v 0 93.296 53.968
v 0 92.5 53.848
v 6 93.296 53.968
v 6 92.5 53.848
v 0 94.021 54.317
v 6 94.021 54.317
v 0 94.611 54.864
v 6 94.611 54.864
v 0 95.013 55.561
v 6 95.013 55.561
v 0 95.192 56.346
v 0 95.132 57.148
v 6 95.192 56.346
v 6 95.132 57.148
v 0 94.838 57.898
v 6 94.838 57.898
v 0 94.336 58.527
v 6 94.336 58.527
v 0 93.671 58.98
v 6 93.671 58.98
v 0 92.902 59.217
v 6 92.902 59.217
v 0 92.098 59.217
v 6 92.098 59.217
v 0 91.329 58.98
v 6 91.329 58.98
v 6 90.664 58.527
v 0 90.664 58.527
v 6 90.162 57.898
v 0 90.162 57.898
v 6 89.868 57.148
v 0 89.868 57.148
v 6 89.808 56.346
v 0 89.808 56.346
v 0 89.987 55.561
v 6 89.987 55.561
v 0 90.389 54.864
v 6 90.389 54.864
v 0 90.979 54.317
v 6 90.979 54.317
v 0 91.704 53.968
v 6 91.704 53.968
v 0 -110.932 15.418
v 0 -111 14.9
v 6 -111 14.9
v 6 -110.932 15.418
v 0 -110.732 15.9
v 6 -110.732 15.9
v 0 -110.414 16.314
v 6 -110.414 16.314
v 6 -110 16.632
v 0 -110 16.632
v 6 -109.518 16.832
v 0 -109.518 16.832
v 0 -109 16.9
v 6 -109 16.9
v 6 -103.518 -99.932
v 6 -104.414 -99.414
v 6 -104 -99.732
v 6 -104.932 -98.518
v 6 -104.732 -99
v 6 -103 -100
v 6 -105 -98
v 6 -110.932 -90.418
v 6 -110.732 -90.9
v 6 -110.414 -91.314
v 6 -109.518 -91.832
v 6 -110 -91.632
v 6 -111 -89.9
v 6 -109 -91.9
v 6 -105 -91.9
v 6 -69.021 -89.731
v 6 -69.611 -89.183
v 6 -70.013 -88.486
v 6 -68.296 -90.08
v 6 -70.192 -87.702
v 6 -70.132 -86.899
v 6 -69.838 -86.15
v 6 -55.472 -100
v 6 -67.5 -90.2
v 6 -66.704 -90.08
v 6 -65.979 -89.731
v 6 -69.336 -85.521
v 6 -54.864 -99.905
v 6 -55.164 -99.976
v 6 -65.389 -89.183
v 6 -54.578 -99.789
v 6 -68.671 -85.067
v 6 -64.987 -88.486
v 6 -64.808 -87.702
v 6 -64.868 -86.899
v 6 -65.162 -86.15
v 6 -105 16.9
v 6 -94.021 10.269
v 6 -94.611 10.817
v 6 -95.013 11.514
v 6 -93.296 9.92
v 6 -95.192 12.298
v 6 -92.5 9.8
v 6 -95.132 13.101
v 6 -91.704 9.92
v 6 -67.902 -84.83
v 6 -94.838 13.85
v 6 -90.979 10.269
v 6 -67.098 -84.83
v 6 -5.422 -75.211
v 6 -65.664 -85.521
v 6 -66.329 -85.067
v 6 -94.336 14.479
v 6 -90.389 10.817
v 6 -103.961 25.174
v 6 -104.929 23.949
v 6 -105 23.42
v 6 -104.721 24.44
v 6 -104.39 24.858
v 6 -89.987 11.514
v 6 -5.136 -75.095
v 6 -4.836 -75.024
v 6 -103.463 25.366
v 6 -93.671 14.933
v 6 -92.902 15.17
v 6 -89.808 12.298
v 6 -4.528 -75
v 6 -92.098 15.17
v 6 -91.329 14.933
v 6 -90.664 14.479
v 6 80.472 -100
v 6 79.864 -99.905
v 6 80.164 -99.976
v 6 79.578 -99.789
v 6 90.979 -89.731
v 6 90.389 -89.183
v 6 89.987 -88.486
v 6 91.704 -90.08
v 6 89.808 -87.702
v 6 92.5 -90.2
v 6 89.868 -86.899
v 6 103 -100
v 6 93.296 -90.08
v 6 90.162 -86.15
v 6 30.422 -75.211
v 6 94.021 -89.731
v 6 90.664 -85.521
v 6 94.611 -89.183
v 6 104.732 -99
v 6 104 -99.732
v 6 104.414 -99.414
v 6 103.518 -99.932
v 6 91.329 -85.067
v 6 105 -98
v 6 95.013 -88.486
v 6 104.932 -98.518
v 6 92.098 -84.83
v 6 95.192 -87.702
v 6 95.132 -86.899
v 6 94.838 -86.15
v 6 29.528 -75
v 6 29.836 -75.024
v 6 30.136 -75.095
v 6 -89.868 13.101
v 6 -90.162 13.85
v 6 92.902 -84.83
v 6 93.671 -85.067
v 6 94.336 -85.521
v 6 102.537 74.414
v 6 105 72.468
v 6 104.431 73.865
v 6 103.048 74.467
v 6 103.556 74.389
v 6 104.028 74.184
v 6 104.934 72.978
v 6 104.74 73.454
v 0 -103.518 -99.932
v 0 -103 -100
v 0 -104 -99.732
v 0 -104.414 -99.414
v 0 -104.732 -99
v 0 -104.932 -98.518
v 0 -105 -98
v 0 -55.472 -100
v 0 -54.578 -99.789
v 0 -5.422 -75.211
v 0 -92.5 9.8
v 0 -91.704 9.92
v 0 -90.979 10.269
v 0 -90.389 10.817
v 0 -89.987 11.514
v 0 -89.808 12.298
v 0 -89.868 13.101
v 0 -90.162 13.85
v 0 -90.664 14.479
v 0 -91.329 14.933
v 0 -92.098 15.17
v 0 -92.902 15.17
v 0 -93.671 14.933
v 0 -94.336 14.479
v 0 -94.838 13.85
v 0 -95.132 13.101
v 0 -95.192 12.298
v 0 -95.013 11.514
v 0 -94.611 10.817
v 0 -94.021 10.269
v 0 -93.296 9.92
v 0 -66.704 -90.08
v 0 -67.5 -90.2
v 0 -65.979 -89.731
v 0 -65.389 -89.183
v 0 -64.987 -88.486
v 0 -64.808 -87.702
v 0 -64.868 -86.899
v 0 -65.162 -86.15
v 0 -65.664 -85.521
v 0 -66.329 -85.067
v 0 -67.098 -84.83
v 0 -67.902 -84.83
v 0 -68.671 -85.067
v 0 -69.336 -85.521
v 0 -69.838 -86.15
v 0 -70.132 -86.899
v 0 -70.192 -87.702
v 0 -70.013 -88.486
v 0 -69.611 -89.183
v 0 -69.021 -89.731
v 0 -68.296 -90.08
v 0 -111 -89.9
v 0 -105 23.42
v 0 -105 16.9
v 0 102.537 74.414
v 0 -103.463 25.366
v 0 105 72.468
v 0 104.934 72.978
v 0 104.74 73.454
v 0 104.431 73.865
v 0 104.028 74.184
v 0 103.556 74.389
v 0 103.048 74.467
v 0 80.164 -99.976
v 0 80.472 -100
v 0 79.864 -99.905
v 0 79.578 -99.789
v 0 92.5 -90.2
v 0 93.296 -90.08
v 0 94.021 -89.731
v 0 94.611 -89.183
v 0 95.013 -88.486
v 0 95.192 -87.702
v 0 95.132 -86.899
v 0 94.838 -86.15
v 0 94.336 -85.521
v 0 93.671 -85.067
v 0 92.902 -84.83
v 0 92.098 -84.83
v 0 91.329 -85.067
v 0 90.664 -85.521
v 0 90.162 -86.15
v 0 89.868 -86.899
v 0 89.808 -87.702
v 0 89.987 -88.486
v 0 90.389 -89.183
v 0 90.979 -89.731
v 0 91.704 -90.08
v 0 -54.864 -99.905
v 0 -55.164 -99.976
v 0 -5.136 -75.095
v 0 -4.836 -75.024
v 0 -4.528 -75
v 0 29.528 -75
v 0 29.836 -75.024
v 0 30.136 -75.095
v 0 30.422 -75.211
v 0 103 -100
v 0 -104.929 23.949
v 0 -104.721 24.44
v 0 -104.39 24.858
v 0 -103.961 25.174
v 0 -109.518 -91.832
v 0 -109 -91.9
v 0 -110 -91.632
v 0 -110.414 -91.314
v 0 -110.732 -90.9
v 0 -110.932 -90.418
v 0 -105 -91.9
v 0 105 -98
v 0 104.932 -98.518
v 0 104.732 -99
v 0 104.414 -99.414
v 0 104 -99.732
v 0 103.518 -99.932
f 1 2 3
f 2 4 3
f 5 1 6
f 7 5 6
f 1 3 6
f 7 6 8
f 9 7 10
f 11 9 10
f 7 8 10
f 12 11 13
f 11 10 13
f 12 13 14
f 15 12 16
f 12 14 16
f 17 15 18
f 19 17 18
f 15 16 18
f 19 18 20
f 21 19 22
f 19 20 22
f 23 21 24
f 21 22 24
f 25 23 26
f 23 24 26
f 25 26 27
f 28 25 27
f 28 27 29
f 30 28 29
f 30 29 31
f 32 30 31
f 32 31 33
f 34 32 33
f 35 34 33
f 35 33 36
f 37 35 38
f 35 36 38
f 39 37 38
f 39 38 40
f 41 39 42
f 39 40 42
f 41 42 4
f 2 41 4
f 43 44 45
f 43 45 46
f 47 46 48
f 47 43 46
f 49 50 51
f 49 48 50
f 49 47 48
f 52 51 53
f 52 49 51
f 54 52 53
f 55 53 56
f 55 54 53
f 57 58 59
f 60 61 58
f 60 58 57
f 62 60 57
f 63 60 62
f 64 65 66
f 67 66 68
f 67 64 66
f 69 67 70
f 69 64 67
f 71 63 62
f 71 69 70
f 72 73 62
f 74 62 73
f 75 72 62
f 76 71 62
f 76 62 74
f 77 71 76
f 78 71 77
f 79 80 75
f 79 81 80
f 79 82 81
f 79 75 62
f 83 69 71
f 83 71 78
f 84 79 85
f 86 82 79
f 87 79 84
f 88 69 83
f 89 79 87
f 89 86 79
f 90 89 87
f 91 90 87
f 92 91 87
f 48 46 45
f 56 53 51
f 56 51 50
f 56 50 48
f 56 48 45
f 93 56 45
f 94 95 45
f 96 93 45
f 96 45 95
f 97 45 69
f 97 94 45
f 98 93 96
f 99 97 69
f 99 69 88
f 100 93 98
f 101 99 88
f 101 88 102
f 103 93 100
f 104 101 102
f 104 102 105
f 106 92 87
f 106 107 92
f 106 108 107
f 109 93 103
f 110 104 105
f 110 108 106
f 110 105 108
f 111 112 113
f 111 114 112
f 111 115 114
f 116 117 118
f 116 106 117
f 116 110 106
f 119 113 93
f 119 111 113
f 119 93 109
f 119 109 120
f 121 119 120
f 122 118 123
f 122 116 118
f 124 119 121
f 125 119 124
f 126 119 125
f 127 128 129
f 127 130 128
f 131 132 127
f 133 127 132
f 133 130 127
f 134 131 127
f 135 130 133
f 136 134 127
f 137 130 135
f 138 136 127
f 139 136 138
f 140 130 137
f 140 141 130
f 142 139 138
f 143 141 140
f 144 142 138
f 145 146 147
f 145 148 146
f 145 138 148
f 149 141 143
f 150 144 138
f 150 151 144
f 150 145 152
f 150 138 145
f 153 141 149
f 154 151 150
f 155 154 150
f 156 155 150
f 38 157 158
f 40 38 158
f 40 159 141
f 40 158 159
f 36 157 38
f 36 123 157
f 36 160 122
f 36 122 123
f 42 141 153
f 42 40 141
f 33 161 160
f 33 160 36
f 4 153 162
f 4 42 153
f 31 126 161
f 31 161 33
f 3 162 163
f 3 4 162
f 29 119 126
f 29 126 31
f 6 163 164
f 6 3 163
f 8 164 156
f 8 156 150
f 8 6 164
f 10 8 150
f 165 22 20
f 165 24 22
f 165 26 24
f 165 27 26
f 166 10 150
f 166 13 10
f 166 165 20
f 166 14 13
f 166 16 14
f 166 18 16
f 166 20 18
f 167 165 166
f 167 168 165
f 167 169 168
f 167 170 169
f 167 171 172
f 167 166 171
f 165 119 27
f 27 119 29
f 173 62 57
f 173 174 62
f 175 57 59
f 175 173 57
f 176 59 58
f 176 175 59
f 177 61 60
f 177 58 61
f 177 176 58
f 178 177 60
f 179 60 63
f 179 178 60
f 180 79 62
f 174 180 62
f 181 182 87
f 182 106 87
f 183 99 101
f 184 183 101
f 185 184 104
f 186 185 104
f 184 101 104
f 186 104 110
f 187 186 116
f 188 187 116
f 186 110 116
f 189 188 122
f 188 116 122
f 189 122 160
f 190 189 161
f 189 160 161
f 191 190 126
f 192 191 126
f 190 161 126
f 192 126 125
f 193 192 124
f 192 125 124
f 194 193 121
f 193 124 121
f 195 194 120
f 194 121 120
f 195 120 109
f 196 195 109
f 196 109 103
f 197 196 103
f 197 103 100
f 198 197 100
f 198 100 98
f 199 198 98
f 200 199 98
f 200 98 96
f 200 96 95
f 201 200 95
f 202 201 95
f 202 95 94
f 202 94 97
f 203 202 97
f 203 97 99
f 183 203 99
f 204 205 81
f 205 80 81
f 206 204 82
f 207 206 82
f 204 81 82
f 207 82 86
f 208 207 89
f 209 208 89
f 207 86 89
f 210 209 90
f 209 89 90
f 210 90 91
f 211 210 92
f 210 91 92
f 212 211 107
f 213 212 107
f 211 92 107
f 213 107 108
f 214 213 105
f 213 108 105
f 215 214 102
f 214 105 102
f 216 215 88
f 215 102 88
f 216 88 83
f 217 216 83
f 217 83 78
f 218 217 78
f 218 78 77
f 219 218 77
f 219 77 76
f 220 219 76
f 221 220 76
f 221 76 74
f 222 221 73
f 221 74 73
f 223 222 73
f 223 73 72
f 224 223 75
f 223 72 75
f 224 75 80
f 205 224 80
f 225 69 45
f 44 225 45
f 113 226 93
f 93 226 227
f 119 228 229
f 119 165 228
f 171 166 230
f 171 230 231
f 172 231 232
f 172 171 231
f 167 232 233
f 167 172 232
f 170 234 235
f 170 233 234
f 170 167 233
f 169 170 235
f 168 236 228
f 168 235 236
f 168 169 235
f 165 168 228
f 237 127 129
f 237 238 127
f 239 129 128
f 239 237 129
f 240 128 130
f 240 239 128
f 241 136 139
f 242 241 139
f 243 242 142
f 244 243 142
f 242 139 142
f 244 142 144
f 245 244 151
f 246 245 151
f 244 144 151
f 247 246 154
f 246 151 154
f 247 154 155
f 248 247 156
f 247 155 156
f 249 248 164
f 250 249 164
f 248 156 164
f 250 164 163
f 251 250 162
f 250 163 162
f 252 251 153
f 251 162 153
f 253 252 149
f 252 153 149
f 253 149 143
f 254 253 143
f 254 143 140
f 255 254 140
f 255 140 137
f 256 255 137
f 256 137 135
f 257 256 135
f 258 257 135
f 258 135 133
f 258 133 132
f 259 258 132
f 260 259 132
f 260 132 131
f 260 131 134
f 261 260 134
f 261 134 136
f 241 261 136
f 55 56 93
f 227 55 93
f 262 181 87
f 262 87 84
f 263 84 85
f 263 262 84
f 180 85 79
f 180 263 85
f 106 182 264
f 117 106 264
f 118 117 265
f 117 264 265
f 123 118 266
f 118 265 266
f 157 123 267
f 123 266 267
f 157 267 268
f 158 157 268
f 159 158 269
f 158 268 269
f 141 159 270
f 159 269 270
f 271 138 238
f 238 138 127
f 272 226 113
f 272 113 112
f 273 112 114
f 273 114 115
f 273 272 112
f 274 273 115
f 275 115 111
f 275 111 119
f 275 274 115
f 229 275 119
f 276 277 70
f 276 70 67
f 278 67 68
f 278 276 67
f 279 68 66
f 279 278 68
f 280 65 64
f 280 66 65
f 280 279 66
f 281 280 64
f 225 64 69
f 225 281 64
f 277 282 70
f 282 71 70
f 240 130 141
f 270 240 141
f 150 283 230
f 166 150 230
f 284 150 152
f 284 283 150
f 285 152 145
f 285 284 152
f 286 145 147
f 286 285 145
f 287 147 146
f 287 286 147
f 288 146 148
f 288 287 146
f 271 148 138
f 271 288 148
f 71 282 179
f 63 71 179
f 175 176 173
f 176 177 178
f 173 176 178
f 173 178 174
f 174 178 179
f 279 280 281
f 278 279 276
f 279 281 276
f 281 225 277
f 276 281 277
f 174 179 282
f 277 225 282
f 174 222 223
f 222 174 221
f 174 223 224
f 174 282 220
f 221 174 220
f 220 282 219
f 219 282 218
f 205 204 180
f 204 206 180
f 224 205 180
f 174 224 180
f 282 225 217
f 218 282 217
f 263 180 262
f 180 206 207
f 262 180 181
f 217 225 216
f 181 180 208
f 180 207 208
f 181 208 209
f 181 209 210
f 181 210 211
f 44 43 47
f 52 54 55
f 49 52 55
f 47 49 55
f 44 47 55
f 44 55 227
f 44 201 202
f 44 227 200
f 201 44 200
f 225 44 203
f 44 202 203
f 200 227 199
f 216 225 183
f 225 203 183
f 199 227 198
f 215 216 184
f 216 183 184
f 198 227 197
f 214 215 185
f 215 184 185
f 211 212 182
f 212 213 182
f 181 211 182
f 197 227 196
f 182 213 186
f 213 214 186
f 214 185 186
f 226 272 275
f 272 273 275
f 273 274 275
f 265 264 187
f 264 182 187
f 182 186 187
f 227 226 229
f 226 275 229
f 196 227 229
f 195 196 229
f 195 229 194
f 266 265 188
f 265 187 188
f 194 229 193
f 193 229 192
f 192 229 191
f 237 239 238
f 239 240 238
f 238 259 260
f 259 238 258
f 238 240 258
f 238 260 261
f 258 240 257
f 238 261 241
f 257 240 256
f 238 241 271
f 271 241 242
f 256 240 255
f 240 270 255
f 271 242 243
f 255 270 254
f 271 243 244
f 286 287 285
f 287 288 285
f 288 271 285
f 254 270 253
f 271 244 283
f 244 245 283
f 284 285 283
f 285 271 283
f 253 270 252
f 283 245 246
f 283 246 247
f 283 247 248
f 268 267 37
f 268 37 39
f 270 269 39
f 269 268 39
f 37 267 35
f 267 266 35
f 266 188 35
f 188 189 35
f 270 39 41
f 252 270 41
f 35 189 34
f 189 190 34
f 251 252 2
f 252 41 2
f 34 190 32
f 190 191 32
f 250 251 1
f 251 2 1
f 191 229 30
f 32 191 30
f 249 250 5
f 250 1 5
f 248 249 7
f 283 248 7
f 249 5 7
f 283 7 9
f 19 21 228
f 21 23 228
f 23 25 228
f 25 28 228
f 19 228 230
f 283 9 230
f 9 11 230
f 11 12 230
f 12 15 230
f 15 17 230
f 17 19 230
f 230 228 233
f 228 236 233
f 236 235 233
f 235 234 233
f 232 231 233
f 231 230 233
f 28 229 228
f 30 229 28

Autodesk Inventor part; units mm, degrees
ref_plane "YZ Plane" through (0, 0, 0) normal (1, 0, 0) x (0, 1, 0)
ref_plane "XZ Plane" through (0, 0, 0) normal (0, 1, 0) x (-1, 0, 0)
ref_plane "XY Plane" through (0, 0, 0) normal (0, 0, 1) x (1, 0, 0)
sketch "Sketch1" plane through (0, 0, 0) normal (1, 0, 0) x (0, 1, 0)
  line L0 (-105, -75) -> (105, -75)
  line L1 (105, -75) -> (105, 75)
  line L2 (105, 75) -> (-105, 75)
  line L3 (-105, 75) -> (-105, -75)
  line L4 (-105, -75) -> (105, 75) construction
  line L5 (105, -75) -> (-105, 75) construction
  point P0 (0, 0)
  point P1 (0, 0)
  point P2 (0, 0)
  dimension "d0" = 150
  dimension "d1" = 210
extrude "Extrusion1" add sketch "Sketch1" along normal blind 6
sketch "Sketch2" plane through (6, 0, 0) normal (1, 0, 0) x (0, 0, -1)
  line L0 (75, -105) -> (75, 105) projected
  line L1 (-75, -105) -> (75, -105) projected
  line L2 (75, 105) -> (100, 105)
  line L3 (100, 105) -> (100, 80)
  line L4 (100, 80) -> (75, 30)
  line L5 (75, 30) -> (75, 105)
  line L6 (75, -105) -> (75, -5)
  line L7 (75, -5) -> (100, -55)
  line L8 (100, -55) -> (100, -105)
  line L9 (100, -105) -> (75, -105)
  point P0 (0, 0)
  dimension "d4" = 25
  dimension "d5" = 50
  dimension "d25" = 50
extrude "Extrusion2" add sketch "Sketch2" against normal blind 6
sketch "Sketch3" plane through (6, 0, 0) normal (1, 0, 0) x (0, 0, -1)
  line L0 (-75, 105) -> (-75, -105) projected
  line L1 (-75, -105) -> (100, -105) projected
  line L2 (100, -105) -> (100, -55) projected
  line L3 (-75, 105) -> (-25, -105)
  line L4 (-25, -105) -> (-75, -105)
  line L5 (-75, -105) -> (-75, 105)
  point P0 (0, 0)
  dimension "d8" = 50
extrude "Extrusion3" cut sketch "Sketch3" against normal through all
sketch "Sketch4" plane through (6, 0, 0) normal (1, 0, 0) x (0, 0, -1)
  line L0 (-25, -105) -> (100, -105) projected
  line L1 (100, -105) -> (100, -55) projected
  line L2 (-16.9, -105) -> (91.9, -105)
  line L3 (91.9, -105) -> (91.9, -111)
  line L4 (91.9, -111) -> (-16.9, -111)
  line L5 (-16.9, -111) -> (-16.9, -105)
  point P0 (0, 0)
  dimension "d11" = 8.1
  dimension "d12" = 8.1
  dimension "d13" = 6
extrude "Extrusion4" add sketch "Sketch4" against normal blind 6
sketch "Sketch5" plane through (6, 0, 0) normal (1, 0, 0) x (0, 0, -1)
  line L0 (-75, 105) -> (-25, -105) projected
  line L1 (91.9, -105) -> (100, -105) projected
  line L2 (100, 80) -> (100, 105) projected
  line L3 (100, 105) -> (-75, 105) projected
  circle A0 centre (-12.5, -92.5) radius 2.7
  circle A1 centre (87.5, -67.5) radius 2.7
  circle A2 centre (87.5, 92.5) radius 2.7
  circle A3 centre (-56.5476, 92.5) radius 2.7
  line L4 (-12.5, -92.5) -> (-56.5476, 92.5) construction
  line L5 (-25, -105) -> (-16.9, -105) projected
  point P0 (0, 0)
  dimension "d17" = 12.5
  dimension "d18" = 12.5
  dimension "d19" = 12.5
  dimension "d21" = 5.4
  dimension "d22" = 37.5
  dimension "d26" = 12.5
extrude "Extrusion5" cut sketch "Sketch5" against normal through all
fillet "Fillet1" radius 2 10 edges at (3, -111, 16.9) (3, -105, 25) (3, -111, -91.9) (3, -105, -100) (3, 105, 75) (3, 105, -100) (3, 80, -100) (3, 30, -75) (3, -5, -75) (3, -55, -100)
properties part number "BottomRightSide"
